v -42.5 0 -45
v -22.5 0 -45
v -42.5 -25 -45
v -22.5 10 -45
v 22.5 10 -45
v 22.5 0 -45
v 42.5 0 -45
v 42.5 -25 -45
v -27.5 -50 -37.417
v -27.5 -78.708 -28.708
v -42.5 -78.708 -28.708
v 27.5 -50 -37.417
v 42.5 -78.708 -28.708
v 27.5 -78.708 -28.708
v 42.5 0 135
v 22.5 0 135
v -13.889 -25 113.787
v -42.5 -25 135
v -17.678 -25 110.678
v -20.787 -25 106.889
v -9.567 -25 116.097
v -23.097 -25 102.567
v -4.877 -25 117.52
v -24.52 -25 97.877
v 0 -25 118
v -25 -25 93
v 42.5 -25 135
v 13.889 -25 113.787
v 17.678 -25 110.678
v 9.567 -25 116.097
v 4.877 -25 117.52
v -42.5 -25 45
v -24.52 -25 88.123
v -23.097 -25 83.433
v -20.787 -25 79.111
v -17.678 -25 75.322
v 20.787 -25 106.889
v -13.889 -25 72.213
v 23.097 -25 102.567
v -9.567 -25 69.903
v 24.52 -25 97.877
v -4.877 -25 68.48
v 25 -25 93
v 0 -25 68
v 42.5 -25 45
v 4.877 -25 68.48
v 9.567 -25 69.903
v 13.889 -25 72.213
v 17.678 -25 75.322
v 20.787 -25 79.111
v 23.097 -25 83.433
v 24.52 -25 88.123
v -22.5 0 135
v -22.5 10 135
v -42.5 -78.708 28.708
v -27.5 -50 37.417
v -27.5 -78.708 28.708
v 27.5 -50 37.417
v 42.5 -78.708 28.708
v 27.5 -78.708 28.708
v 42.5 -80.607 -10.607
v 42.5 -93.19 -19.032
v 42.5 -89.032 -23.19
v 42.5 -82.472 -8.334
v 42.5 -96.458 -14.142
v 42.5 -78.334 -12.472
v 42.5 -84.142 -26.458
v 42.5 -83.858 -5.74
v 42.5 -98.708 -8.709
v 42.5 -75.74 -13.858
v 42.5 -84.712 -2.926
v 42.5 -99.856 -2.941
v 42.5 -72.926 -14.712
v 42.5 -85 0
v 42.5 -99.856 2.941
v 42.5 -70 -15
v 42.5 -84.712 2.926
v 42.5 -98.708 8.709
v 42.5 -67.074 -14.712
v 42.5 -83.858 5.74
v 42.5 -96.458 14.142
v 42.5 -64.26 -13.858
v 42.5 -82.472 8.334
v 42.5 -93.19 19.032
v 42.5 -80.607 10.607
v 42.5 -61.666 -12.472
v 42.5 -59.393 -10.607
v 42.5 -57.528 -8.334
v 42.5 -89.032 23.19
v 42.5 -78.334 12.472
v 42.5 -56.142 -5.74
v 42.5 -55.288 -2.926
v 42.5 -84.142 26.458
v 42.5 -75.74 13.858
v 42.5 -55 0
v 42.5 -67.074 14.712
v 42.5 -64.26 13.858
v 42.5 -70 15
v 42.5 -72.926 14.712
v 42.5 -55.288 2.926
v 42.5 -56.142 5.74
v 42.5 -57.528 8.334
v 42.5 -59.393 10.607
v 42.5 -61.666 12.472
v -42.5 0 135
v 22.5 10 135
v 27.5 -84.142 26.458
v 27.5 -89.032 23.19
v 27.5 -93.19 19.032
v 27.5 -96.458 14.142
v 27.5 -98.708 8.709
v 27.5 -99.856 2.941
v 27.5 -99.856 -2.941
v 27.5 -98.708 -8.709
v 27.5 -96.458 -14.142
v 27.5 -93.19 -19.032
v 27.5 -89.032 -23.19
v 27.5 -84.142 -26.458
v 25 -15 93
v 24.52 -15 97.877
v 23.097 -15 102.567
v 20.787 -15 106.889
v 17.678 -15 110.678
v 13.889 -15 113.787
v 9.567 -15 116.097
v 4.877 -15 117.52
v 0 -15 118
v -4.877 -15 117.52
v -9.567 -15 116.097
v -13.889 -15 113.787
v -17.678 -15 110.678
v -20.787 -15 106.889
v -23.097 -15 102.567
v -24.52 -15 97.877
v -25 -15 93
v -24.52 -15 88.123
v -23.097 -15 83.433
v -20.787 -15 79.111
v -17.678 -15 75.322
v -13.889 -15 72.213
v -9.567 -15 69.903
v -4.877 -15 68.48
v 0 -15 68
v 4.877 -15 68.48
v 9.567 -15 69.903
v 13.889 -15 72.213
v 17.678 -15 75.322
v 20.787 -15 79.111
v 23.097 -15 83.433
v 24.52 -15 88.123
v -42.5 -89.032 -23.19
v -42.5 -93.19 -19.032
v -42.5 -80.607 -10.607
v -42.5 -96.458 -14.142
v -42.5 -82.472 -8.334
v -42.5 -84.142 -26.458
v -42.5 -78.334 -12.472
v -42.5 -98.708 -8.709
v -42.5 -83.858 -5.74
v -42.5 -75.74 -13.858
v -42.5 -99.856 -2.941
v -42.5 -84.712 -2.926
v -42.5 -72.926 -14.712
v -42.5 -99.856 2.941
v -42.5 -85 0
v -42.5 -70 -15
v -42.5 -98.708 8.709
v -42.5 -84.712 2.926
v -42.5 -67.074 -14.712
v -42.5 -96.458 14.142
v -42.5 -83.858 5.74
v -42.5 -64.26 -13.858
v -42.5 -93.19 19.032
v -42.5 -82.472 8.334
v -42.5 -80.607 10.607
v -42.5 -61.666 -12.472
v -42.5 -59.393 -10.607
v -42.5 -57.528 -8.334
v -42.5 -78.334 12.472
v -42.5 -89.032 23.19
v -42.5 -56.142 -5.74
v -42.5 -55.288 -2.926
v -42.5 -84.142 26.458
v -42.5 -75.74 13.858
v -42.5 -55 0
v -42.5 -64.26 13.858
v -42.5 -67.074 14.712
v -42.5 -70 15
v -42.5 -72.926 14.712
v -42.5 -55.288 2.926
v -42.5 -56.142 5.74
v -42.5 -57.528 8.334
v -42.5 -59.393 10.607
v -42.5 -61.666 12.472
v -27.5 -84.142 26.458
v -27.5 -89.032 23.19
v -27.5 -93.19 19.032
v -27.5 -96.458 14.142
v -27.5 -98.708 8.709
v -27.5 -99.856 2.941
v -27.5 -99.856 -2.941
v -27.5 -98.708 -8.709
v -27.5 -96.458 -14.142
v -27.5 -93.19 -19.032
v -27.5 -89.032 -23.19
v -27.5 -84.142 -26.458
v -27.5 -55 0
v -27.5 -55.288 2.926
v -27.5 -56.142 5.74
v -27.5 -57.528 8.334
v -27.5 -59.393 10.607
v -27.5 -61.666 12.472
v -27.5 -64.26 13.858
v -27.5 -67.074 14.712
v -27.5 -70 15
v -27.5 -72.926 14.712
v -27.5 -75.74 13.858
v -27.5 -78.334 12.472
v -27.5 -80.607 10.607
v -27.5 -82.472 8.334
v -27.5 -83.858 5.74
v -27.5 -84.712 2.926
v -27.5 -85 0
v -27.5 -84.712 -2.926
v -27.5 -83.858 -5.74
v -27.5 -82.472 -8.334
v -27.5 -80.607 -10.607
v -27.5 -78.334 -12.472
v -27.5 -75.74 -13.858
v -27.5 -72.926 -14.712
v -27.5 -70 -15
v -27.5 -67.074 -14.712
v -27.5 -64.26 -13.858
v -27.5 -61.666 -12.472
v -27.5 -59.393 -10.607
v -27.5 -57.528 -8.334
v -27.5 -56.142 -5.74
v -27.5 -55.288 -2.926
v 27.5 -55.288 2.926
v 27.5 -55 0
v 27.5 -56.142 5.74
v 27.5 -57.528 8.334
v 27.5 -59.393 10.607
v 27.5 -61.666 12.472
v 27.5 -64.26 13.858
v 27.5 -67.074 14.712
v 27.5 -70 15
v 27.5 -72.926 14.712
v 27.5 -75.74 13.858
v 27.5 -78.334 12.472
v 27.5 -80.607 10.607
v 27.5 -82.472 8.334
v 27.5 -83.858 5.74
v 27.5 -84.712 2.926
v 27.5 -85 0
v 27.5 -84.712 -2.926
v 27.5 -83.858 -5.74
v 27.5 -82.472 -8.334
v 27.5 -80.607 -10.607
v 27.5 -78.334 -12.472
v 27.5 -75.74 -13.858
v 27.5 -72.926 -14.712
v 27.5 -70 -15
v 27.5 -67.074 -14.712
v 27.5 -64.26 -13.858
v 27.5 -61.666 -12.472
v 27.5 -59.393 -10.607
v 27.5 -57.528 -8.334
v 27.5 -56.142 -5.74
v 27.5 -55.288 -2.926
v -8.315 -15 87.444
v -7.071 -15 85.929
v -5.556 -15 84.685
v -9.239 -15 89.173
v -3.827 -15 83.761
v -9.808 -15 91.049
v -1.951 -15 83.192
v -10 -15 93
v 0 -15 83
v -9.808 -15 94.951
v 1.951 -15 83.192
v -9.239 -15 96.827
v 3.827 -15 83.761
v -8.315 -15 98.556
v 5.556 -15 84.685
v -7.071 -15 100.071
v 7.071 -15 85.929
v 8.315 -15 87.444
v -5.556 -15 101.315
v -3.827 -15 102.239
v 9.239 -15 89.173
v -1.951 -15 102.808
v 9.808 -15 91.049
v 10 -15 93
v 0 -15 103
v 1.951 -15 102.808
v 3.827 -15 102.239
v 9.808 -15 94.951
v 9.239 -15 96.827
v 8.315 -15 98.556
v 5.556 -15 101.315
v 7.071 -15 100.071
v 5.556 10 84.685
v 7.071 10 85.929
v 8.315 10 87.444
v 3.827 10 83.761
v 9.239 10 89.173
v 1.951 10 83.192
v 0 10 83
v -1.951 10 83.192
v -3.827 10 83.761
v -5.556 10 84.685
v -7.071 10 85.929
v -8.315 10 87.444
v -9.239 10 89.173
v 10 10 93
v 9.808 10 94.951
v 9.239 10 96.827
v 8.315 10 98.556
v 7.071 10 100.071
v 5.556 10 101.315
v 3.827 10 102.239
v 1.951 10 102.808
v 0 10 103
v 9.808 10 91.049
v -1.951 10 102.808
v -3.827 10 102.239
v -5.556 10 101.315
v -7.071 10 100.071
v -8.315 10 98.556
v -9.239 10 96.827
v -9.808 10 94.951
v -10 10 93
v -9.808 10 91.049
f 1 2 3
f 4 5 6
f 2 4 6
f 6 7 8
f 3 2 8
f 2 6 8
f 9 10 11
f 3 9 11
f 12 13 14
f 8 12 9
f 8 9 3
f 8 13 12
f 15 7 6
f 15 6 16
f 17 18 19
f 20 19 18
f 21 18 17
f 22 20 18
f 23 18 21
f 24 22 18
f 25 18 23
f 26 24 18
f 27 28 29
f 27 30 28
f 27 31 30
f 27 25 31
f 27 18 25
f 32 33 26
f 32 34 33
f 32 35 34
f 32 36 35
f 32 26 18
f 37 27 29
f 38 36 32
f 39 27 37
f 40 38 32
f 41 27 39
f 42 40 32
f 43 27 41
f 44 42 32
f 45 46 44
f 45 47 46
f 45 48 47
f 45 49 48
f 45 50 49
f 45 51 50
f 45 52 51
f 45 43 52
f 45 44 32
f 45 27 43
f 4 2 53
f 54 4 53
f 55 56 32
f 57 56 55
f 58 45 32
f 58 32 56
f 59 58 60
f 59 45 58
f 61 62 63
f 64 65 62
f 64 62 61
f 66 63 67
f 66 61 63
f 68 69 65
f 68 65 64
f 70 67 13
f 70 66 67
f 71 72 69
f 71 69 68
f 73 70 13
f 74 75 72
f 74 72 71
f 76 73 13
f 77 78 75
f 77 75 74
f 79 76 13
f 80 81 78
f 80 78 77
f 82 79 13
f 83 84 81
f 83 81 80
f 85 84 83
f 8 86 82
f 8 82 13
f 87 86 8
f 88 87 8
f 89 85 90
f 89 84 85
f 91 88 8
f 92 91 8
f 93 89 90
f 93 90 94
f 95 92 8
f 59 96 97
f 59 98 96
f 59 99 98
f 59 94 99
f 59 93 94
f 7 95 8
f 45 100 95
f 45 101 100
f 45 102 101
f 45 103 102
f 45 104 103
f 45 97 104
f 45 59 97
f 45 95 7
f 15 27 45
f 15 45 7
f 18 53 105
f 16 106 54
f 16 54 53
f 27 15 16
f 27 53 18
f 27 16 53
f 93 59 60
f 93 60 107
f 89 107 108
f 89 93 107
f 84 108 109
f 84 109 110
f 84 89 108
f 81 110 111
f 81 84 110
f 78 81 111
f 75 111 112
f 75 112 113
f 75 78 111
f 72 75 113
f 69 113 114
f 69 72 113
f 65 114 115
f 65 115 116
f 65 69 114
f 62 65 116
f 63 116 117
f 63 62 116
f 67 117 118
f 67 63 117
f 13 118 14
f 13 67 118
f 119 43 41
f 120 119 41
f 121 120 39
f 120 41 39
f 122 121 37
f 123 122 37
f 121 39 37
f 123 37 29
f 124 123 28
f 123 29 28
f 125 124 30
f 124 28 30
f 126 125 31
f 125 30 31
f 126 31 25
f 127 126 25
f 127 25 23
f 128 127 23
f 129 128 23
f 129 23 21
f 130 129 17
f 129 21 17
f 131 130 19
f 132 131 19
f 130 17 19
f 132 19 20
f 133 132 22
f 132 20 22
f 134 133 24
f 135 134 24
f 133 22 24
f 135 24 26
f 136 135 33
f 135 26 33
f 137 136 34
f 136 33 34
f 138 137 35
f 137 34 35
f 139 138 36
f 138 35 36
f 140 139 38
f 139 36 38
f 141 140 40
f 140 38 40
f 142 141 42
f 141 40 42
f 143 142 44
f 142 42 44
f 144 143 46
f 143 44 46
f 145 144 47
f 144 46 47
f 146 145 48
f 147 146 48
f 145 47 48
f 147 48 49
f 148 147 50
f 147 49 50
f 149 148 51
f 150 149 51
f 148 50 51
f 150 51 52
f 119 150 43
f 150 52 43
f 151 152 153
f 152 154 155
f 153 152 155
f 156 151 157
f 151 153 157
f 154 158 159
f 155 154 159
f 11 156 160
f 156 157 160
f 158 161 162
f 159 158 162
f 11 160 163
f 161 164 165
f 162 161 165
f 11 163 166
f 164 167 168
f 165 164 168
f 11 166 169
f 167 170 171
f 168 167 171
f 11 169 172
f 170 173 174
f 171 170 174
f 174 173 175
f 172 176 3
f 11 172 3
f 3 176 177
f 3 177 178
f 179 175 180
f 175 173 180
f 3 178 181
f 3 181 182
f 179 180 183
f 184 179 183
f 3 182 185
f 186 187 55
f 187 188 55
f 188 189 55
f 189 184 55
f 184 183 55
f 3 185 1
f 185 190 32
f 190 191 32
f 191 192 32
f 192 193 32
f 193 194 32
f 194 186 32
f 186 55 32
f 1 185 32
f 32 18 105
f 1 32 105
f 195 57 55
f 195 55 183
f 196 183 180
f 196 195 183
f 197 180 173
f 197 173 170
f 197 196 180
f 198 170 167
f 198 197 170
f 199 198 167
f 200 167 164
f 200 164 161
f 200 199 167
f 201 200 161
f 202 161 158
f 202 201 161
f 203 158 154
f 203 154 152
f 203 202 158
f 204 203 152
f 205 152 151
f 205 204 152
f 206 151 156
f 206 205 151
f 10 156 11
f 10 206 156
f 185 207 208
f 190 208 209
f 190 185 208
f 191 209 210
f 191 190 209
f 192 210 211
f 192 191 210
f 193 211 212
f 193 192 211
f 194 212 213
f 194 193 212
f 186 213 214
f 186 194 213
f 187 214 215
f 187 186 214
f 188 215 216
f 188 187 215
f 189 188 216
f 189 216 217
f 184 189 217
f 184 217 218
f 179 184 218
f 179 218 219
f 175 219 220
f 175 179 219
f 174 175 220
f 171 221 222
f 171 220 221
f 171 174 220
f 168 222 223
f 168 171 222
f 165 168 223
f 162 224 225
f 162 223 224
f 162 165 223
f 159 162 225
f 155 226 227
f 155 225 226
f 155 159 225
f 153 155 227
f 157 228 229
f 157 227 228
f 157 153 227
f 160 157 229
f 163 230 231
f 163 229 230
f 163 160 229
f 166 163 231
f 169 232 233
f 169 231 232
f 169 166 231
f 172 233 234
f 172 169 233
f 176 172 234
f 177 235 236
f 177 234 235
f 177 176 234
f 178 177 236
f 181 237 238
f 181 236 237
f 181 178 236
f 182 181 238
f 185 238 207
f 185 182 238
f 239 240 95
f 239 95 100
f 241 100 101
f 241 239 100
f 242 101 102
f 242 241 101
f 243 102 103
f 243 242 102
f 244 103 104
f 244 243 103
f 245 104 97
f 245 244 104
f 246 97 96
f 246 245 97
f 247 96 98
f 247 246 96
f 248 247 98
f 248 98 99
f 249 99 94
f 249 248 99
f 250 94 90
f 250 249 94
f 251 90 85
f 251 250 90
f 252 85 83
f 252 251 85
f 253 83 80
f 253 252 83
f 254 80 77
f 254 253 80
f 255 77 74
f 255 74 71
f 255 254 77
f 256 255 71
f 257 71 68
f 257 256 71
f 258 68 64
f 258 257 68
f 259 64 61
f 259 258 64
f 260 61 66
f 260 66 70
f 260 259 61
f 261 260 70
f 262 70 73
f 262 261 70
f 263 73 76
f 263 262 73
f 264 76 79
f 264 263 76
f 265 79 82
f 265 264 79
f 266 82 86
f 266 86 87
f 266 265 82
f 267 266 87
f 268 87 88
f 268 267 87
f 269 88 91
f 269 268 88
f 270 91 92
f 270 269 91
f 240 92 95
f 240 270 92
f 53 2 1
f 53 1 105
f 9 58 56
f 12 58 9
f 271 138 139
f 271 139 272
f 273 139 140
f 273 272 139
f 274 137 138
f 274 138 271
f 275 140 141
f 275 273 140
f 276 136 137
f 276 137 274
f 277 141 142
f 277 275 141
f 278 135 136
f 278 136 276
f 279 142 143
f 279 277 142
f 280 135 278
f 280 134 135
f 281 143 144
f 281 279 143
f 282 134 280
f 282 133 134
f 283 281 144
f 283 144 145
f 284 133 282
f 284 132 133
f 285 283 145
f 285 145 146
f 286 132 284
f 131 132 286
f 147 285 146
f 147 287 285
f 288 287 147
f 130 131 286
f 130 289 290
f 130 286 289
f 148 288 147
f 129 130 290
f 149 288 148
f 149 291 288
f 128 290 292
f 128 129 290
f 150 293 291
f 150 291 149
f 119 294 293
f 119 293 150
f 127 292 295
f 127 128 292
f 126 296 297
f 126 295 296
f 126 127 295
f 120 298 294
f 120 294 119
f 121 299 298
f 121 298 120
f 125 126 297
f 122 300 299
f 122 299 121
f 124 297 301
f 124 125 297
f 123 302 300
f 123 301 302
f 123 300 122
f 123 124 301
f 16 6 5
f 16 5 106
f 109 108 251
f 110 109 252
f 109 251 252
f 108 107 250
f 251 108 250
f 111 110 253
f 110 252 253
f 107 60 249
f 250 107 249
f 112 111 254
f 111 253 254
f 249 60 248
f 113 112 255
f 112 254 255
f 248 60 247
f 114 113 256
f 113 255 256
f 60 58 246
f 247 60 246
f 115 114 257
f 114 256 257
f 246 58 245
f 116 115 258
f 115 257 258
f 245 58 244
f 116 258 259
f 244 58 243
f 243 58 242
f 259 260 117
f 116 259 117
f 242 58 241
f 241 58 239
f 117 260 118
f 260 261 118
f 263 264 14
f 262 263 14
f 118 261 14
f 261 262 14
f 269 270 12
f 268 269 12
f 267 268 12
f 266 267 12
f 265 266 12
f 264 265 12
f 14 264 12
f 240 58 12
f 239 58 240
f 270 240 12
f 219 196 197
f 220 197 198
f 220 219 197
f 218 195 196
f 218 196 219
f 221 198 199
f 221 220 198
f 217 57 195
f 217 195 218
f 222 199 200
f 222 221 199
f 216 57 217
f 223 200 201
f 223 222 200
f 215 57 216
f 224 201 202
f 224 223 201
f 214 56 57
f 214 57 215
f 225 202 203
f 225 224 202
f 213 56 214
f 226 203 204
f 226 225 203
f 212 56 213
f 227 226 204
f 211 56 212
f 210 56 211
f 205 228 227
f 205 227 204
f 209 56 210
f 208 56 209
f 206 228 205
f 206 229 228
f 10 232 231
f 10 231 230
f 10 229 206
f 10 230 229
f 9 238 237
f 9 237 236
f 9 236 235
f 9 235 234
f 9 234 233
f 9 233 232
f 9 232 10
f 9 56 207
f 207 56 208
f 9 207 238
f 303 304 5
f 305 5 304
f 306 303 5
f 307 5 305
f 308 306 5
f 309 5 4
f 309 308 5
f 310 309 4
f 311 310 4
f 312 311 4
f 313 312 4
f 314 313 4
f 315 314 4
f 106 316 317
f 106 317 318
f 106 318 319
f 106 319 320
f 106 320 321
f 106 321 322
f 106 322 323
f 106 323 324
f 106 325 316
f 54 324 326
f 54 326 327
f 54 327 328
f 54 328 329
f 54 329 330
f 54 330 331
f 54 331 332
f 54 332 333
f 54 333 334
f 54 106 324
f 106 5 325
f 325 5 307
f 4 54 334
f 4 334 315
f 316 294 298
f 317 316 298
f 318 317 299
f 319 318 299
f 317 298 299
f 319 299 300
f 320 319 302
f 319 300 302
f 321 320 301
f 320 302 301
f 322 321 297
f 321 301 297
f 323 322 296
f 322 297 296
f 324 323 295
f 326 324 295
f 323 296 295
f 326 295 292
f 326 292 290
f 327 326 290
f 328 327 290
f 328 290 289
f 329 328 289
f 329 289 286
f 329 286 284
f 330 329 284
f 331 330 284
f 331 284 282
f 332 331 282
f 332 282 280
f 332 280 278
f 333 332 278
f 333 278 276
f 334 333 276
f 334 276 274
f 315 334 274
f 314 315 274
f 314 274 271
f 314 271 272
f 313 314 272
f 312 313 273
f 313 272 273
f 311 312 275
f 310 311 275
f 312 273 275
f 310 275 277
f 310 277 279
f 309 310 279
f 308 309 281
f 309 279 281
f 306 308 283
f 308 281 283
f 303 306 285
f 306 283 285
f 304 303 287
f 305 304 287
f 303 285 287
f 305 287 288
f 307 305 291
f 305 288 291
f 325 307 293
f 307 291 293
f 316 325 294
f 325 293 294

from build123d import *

# Parameters (mm, degrees)
SKETCH001_W     = 143.571686
SKETCH001_H     = 55
PAD001_DEPTH    = 60
SKETCH_R        = 15
PAD_DEPTH       = 42.5
SKETCH002_W     = 45
SKETCH002_H     = 180
PAD002_DEPTH    = 10
SKETCH003_R     = 25
POCKET_DEPTH    = 10
SKETCH004_R     = 10
POCKET001_DEPTH = 25.001


with BuildPart() as pad001:
    # Sketch001 → Pad001 (new body)
    with BuildSketch(Plane(origin=(0, -50, 0), x_dir=(0, 0, -1), z_dir=(0, -1, 0))):
        with Locations((2.390221, 0)):
            Rectangle(SKETCH001_W, SKETCH001_H)
    extrude(amount=PAD001_DEPTH)


with BuildPart() as pocket001:
    # Sketch → Pad (new body, symmetric)
    with BuildSketch(Plane.YZ):
        with BuildLine():
            Line((0, -45), (0, 135))
            Line((0, 135), (-25, 135))
            Line((-25, 135), (-25, 45))
            Line((-25, 45), (-78.708345, 28.708269))
            ThreePointArc((-78.708345, 28.708269), (-100, 2e-06), (-78.708348, -28.708268))
            Line((-78.708348, -28.708268), (-25, -45))
            Line((0, -45), (-25, -45))
        make_face()
        with Locations((-70, 0)):
            Circle(SKETCH_R, mode=Mode.SUBTRACT)
    extrude(amount=PAD_DEPTH, both=True)

    # Cut: cut Pad001
    add(pad001.part, mode=Mode.SUBTRACT)

    # Sketch002 → Pad002 (new body)
    with BuildSketch(Plane(origin=(0, 0, 0), x_dir=(-1, 0, 0), z_dir=(0, 1, 0))):
        with Locations((0, 45)):
            Rectangle(SKETCH002_W, SKETCH002_H)
    extrude(amount=PAD002_DEPTH)

    # Sketch003 → Pocket (cut)
    with BuildSketch(Plane.XZ.offset(25)):
        with Locations((0, 93)):
            Circle(SKETCH003_R)
    extrude(amount=-POCKET_DEPTH, mode=Mode.SUBTRACT)

    # Sketch004 → Pocket001 (cut, through all)
    with BuildSketch(Plane.XZ.offset(15)):
        with Locations((0, 93)):
            Circle(SKETCH004_R)
    extrude(amount=-POCKET001_DEPTH, mode=Mode.SUBTRACT)


solid = pocket001.part
